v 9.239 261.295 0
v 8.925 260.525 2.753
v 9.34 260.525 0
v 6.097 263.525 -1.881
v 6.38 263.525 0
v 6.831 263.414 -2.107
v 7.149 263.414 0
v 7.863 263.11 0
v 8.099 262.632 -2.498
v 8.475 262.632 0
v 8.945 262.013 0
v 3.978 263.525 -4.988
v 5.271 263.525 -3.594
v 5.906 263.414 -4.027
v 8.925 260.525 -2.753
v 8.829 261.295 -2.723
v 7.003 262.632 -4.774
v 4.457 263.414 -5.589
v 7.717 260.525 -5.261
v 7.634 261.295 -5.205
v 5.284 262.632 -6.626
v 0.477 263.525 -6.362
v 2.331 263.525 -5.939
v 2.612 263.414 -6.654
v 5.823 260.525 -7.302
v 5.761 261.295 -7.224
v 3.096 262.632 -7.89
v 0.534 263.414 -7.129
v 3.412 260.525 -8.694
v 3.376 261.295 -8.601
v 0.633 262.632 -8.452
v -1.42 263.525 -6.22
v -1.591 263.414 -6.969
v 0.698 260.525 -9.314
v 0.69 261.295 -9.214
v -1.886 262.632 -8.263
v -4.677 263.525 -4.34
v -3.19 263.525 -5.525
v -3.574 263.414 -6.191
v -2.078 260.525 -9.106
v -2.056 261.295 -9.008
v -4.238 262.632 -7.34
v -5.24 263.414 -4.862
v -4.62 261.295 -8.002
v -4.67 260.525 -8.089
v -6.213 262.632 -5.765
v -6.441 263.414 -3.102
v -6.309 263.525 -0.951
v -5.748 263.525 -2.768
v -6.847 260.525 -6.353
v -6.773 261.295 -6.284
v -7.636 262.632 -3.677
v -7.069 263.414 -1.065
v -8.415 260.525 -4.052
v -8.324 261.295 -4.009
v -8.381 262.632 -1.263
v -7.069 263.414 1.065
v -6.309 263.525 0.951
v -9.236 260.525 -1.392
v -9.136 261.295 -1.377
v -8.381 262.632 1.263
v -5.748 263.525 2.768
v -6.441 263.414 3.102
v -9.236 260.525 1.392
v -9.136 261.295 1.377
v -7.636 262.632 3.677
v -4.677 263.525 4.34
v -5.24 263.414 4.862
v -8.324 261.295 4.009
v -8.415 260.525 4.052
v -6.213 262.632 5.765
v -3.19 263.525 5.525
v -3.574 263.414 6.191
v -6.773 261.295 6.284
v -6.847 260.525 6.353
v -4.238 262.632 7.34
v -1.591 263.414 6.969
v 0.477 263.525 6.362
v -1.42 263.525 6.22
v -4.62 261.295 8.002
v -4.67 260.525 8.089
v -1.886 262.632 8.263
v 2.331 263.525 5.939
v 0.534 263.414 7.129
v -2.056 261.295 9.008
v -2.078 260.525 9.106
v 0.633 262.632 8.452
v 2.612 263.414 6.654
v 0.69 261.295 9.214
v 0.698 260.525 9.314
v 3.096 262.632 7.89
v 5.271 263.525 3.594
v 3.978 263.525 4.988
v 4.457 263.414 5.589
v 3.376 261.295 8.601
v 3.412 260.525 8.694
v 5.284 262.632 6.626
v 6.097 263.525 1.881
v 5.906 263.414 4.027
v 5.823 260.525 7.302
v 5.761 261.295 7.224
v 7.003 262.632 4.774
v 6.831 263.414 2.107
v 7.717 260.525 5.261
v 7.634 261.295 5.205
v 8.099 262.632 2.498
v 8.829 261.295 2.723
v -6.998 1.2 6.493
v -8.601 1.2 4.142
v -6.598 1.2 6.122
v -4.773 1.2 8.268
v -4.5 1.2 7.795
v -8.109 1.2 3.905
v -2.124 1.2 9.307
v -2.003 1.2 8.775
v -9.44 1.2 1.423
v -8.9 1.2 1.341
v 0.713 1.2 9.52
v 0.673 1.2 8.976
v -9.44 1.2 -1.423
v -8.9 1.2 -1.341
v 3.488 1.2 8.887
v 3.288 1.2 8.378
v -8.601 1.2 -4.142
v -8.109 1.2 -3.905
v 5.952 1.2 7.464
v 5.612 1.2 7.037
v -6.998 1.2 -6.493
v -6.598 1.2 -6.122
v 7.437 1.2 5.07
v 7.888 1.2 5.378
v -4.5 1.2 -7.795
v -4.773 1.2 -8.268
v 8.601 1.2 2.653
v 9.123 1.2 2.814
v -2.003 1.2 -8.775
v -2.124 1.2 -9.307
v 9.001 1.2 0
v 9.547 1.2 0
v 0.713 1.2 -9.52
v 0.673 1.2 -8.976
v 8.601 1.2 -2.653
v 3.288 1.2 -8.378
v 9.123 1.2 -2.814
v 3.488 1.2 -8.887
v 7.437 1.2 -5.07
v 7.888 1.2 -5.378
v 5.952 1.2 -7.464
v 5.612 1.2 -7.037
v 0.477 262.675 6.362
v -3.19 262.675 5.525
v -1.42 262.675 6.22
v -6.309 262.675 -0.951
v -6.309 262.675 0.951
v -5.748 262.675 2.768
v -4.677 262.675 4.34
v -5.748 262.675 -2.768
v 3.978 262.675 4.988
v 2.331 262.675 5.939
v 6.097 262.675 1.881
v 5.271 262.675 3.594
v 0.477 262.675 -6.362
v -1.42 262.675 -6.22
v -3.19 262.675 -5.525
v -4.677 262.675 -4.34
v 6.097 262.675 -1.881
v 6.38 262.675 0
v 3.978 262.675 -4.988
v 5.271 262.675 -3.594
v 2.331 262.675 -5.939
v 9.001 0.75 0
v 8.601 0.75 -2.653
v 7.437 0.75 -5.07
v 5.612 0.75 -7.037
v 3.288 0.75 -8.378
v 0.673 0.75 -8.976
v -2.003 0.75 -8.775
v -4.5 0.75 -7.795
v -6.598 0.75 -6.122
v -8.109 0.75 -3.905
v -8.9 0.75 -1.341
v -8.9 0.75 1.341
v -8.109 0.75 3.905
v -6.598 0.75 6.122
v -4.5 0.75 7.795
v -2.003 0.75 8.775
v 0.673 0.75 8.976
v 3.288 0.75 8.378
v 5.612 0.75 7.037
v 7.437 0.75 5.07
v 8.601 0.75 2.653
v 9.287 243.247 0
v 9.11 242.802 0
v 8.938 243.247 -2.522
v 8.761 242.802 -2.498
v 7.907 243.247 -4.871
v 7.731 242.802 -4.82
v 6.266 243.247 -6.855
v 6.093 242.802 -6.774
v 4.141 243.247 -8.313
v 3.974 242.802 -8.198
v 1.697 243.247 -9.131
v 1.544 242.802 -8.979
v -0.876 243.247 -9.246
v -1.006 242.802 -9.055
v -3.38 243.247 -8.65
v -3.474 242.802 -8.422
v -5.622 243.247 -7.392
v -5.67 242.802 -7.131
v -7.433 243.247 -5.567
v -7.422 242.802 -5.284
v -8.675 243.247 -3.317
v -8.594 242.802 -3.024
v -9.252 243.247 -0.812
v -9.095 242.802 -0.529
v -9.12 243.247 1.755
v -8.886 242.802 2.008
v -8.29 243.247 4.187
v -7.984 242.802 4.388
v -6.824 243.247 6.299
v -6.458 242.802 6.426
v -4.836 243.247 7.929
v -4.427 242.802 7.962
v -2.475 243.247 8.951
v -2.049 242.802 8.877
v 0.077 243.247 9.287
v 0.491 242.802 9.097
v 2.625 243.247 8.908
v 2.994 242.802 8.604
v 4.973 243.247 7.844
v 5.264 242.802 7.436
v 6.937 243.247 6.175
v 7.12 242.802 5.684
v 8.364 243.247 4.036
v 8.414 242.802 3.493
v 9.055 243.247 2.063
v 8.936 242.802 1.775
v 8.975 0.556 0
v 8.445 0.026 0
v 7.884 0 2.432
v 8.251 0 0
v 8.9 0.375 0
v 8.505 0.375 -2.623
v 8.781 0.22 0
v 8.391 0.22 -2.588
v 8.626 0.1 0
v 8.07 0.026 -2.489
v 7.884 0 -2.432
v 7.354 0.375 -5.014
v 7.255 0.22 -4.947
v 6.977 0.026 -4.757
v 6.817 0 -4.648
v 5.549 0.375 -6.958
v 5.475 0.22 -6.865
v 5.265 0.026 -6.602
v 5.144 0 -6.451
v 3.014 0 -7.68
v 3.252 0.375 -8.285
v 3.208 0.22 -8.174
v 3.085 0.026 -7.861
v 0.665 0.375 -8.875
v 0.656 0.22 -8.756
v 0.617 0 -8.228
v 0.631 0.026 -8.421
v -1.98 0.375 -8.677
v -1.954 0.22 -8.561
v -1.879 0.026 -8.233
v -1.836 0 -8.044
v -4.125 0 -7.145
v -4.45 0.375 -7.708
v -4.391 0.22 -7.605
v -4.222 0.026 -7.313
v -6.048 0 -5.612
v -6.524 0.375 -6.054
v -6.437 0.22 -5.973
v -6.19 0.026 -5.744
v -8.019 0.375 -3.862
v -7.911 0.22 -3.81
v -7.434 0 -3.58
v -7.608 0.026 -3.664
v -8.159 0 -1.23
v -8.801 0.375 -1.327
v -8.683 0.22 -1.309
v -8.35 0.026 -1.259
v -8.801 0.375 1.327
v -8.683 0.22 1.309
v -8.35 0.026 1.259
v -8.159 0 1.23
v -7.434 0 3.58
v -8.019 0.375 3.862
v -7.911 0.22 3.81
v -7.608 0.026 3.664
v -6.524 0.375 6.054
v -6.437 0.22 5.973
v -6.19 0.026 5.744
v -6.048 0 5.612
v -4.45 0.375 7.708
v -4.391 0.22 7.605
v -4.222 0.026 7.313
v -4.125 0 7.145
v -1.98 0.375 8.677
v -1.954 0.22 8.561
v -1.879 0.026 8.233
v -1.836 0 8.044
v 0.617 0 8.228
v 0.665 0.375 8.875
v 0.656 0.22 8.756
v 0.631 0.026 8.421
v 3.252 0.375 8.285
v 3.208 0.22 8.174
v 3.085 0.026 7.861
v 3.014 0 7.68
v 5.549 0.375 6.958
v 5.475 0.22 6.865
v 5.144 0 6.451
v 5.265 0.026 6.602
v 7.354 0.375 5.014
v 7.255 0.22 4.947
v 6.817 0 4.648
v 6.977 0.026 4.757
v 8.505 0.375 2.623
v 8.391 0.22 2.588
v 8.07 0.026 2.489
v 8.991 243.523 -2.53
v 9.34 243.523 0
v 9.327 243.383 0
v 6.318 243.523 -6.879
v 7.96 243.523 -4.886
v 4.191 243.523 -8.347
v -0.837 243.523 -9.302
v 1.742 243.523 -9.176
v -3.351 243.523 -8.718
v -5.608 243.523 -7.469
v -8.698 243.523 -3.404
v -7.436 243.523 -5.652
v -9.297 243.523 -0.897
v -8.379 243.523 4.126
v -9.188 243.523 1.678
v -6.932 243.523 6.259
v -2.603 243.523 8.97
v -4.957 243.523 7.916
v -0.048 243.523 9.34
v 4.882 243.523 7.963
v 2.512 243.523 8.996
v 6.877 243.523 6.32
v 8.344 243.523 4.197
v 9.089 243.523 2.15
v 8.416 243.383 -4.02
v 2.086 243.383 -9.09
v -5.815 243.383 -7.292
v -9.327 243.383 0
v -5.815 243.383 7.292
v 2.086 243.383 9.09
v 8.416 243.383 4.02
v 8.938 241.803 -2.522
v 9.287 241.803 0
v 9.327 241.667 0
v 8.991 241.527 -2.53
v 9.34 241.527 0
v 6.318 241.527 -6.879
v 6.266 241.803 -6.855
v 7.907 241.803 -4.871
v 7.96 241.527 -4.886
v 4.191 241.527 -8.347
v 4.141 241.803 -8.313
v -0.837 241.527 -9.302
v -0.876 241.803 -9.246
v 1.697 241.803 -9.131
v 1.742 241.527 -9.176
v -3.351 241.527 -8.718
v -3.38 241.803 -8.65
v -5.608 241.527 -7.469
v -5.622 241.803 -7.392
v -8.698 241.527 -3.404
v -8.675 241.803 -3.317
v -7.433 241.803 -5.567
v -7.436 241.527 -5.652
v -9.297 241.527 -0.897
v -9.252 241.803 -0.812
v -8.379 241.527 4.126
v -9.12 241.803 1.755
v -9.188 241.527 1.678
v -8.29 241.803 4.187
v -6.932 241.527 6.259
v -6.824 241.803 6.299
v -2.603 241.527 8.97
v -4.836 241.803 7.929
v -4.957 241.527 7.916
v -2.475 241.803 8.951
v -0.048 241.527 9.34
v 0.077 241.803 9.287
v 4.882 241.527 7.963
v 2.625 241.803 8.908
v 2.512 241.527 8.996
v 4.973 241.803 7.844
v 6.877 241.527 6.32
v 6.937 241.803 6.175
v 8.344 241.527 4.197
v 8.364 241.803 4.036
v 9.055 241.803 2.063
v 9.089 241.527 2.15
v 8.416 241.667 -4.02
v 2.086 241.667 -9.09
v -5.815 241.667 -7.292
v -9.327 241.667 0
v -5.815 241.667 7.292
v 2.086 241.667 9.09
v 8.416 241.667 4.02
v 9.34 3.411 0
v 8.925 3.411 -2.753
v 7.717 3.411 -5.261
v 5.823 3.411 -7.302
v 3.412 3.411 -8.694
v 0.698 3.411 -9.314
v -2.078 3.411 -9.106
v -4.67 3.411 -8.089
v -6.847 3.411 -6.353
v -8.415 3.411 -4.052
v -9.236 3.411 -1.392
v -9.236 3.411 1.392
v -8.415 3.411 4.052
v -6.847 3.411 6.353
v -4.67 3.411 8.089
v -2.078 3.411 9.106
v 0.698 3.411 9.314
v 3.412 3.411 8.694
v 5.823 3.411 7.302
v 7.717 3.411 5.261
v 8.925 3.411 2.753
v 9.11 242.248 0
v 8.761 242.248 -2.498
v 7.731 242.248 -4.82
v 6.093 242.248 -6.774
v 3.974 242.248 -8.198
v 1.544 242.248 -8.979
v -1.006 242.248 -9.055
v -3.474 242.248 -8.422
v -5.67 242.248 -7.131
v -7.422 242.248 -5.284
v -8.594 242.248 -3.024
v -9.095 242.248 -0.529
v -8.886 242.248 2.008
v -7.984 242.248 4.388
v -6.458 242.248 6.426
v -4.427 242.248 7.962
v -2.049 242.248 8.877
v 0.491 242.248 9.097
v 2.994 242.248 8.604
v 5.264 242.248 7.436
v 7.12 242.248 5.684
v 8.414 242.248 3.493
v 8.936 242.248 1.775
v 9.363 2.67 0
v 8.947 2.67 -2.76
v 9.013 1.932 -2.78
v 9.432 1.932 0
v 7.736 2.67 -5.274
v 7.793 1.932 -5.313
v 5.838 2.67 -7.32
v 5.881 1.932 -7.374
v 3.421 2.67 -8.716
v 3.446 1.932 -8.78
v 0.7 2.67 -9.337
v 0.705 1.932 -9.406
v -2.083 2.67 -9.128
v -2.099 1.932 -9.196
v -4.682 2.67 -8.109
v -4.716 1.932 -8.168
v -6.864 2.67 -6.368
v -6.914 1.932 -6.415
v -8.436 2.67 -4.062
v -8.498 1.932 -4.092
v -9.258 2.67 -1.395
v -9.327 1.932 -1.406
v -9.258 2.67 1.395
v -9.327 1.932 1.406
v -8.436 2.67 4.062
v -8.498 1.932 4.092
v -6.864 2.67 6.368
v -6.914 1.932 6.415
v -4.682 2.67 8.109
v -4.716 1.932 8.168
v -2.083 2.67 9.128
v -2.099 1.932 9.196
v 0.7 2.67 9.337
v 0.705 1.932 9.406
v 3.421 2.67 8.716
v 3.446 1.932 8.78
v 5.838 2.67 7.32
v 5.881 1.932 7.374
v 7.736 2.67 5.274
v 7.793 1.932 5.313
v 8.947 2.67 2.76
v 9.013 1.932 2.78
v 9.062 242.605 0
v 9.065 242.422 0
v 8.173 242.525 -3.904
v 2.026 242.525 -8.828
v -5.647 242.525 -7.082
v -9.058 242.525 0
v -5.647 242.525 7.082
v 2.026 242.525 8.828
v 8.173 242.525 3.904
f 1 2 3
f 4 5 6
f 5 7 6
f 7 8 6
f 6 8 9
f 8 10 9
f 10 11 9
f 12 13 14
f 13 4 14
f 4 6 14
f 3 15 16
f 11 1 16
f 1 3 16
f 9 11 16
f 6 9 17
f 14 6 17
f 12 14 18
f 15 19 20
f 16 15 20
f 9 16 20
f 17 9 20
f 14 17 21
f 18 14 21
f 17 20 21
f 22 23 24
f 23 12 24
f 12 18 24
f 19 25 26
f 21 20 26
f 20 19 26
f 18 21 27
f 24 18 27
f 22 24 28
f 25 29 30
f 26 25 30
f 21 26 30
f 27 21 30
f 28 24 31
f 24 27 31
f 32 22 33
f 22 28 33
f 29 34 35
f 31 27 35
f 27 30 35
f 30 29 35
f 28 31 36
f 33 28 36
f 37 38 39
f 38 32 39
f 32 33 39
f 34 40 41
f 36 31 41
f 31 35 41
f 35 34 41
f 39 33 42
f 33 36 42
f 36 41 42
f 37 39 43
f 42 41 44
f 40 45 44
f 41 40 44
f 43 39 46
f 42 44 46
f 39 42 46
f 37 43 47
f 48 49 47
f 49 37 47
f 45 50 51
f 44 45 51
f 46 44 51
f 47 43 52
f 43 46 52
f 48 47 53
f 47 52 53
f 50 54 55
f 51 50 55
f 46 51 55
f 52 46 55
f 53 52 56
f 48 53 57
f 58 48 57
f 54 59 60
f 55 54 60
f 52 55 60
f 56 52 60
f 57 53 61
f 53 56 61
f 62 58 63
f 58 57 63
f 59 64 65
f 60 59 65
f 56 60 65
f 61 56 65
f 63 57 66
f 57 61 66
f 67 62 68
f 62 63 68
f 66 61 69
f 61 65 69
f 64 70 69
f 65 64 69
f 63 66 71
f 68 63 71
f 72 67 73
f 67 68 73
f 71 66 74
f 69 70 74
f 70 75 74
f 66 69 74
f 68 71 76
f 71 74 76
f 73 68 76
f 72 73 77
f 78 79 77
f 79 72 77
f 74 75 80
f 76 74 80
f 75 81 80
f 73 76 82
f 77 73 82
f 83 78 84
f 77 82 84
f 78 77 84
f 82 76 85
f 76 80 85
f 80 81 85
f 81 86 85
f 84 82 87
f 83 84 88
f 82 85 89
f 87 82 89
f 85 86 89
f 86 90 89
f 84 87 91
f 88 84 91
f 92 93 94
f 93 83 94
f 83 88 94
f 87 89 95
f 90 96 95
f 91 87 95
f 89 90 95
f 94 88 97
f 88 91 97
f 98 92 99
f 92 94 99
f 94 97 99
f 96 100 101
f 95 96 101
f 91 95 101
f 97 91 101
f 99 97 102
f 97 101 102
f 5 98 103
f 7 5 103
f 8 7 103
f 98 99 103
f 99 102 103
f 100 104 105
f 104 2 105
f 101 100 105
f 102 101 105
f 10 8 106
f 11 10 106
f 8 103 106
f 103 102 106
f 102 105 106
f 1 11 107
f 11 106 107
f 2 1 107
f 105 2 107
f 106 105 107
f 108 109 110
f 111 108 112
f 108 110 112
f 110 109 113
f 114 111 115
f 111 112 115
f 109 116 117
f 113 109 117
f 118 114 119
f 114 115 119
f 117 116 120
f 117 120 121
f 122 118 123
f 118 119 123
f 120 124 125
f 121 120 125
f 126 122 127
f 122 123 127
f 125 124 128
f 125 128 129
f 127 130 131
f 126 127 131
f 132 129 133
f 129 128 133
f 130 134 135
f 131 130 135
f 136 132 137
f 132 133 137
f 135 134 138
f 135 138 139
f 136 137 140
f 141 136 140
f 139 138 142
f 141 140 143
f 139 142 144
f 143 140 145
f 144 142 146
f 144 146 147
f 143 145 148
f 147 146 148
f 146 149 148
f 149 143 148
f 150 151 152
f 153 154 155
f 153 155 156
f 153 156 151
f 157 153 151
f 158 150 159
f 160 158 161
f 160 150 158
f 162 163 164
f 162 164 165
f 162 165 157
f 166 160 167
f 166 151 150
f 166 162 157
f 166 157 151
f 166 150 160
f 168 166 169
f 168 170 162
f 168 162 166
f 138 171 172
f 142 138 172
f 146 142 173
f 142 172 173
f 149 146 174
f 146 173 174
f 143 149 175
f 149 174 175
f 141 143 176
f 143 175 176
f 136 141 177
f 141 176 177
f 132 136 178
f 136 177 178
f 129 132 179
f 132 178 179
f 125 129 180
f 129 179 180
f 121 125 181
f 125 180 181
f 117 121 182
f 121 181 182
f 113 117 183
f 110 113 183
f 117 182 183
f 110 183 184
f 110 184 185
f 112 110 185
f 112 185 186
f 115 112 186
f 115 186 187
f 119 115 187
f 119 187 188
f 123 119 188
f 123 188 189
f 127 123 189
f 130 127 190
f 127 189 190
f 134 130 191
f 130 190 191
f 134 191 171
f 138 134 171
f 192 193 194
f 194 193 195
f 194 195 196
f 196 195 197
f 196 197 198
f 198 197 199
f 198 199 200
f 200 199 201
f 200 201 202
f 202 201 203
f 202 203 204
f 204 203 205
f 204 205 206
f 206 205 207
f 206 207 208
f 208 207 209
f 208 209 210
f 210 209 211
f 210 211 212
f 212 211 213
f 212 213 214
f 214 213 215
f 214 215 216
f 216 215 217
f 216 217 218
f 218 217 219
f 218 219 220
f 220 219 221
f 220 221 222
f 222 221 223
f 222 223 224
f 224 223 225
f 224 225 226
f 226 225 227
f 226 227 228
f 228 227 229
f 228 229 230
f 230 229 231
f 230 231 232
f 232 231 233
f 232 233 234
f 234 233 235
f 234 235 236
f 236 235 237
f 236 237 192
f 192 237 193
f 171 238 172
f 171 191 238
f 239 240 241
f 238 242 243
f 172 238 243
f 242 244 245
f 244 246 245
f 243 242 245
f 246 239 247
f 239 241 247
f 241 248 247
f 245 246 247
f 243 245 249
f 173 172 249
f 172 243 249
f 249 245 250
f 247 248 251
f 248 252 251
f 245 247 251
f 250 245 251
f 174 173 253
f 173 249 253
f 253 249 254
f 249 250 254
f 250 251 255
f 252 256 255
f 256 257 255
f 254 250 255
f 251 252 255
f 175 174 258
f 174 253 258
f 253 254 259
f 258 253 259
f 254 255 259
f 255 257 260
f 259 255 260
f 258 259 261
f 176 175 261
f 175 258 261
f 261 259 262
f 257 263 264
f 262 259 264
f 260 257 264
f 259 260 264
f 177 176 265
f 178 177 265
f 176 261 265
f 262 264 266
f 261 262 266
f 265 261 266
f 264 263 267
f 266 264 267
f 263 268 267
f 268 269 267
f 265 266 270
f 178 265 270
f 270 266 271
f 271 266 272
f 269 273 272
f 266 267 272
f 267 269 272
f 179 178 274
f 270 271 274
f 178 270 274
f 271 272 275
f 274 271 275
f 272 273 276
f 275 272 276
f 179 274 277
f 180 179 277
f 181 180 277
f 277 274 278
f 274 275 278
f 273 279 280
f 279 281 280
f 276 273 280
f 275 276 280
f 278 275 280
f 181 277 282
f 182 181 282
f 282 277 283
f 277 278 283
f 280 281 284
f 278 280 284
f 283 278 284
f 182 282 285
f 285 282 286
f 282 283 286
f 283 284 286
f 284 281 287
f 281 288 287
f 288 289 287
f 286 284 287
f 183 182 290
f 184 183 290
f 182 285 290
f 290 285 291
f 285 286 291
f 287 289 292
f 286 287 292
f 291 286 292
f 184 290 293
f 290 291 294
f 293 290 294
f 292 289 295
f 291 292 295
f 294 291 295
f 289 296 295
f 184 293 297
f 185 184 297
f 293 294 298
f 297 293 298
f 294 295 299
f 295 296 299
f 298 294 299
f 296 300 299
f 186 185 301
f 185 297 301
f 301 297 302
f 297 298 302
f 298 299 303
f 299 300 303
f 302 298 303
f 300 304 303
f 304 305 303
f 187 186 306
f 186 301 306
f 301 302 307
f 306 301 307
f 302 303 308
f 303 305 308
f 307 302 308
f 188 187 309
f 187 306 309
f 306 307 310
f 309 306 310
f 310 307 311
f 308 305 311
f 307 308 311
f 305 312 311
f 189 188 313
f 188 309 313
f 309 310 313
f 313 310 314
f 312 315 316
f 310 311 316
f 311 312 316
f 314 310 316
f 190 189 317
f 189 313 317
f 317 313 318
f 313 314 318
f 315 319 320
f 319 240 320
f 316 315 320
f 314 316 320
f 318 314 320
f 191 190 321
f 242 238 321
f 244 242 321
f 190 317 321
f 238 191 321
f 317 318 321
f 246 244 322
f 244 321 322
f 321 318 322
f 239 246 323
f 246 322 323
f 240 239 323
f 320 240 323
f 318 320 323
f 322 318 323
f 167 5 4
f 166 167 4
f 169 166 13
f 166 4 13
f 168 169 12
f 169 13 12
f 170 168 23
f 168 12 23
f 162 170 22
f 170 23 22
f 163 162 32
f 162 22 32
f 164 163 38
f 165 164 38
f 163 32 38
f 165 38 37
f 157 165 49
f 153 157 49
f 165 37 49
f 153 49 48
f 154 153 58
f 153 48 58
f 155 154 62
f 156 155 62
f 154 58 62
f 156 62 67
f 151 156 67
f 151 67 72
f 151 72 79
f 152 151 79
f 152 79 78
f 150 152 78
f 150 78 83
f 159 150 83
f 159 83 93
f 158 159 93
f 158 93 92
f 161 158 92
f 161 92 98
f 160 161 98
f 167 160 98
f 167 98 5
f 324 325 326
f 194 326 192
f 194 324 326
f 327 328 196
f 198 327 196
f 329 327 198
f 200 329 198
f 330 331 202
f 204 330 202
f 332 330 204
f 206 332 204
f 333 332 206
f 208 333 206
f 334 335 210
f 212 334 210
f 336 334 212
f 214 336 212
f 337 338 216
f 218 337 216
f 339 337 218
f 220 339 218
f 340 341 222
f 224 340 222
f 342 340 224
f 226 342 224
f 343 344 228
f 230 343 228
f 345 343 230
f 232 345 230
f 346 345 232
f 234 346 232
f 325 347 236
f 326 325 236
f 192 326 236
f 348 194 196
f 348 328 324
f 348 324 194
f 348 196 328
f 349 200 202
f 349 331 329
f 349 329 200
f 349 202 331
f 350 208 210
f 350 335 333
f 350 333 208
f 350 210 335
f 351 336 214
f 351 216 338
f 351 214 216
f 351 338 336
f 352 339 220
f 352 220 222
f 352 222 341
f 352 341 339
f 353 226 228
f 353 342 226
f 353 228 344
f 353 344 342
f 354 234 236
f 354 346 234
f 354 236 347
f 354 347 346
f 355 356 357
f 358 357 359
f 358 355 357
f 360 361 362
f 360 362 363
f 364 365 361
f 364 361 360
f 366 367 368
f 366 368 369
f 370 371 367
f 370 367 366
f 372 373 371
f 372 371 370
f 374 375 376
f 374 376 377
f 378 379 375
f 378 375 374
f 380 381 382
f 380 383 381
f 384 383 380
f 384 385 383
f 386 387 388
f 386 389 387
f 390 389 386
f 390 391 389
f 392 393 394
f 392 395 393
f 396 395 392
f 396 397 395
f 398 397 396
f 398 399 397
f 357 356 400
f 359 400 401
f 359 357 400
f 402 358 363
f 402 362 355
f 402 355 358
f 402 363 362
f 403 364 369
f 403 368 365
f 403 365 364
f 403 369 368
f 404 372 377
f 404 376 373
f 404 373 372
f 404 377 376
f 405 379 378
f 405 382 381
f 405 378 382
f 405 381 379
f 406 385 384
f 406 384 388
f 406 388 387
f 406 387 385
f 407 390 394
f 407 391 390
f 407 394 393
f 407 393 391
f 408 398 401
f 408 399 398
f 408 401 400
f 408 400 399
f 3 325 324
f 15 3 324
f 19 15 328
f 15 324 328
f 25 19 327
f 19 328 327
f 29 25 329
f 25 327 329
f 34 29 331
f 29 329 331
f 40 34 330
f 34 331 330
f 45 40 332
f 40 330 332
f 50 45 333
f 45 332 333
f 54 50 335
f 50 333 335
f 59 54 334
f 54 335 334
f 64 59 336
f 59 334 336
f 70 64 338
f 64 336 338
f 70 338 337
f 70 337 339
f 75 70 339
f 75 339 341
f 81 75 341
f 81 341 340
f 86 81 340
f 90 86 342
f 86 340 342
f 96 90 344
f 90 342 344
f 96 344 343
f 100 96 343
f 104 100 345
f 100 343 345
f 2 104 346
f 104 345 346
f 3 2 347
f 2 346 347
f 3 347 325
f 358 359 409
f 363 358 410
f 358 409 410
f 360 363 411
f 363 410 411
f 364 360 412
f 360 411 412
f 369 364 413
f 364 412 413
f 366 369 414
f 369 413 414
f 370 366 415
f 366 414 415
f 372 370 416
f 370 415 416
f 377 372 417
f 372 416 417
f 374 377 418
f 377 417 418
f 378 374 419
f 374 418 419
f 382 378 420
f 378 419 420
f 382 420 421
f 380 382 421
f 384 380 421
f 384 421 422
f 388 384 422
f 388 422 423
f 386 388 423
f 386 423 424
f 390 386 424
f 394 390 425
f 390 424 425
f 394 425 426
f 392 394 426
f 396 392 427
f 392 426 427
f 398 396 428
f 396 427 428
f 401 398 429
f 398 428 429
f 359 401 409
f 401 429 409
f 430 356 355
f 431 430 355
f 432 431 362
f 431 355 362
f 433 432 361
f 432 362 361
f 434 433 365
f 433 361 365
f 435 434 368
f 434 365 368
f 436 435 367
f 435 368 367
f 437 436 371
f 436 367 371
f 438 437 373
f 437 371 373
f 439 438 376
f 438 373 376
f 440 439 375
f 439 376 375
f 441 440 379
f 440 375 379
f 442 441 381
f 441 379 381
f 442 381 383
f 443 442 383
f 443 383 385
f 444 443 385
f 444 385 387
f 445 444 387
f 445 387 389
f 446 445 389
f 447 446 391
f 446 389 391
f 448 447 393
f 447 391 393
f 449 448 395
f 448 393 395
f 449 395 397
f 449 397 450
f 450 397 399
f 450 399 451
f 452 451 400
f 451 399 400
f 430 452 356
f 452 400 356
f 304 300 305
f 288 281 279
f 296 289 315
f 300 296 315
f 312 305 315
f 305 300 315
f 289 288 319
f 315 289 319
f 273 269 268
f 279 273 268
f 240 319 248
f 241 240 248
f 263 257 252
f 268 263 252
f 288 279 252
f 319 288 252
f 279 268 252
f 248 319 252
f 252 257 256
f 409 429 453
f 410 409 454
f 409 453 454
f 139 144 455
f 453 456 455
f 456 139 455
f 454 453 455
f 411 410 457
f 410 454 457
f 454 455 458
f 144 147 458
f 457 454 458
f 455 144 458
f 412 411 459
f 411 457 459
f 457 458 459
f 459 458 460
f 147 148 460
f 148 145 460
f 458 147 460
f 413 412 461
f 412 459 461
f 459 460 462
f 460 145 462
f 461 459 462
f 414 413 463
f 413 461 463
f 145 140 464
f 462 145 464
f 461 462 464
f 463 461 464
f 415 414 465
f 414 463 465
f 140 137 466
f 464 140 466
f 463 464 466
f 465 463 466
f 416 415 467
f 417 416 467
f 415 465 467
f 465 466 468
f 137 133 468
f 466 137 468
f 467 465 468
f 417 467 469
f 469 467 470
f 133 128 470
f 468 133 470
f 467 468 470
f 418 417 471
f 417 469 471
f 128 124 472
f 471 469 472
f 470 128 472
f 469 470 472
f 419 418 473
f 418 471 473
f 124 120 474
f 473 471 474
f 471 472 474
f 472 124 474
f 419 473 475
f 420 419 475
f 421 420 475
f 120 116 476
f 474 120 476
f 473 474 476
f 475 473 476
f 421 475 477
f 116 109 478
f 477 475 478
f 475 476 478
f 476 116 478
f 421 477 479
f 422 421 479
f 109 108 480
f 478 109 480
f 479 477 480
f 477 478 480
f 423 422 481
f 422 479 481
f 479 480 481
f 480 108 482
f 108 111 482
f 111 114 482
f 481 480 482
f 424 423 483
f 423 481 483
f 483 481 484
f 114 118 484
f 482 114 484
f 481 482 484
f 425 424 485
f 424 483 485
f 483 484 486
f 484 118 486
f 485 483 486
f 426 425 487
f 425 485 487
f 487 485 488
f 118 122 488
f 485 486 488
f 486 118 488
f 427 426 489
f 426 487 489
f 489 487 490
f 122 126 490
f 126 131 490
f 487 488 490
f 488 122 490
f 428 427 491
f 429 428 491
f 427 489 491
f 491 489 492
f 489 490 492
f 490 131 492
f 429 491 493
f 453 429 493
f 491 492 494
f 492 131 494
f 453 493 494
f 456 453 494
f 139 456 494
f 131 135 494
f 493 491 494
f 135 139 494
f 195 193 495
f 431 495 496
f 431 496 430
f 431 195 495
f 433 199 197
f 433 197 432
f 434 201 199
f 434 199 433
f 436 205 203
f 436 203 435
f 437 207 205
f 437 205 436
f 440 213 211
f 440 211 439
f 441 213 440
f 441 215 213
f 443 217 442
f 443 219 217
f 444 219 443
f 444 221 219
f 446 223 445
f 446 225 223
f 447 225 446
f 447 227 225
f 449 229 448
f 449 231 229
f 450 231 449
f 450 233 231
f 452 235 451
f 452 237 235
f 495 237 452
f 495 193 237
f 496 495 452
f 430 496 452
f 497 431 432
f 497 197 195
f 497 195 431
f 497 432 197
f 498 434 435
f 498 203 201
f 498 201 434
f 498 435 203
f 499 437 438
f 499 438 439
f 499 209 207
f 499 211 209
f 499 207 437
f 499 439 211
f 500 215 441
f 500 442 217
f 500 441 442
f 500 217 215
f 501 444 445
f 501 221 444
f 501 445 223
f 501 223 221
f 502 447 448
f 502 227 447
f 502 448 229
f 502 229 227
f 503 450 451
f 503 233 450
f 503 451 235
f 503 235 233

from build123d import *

# Parameters (mm, degrees)
FILLET1_R          = 3
FILLET2_R          = 0.75
SKETCH3_R          = 6.38
CUT_EXTRUDE1_DEPTH = 0.85


with BuildPart() as part:
    # Sketch2 → Revolve1 (revolve)
    with BuildSketch(Plane.XY):
        with BuildLine():
            Line((0, 263.525), (9.34, 263.525))
            Line((9.34, 263.525), (9.34, 243.380049267))
            Line((9.34, 243.380049267), (9.000677154, 242.525))
            Line((9.000677154, 242.525), (9.34, 241.669950733))
            Line((9.34, 241.669950733), (9.34, 3.410583034))
            ThreePointArc((9.34, 3.410583034), (9.391810091, 2.300465987), (9.546789941, 1.2))
            Line((9.546789941, 1.2), (9.000677154, 1.2))
            Line((9.000677154, 1.2), (9.000677154, 0))
            Line((9.000677154, 0), (0, 0))
            Line((0, 0), (0, 263.525))
        make_face()
    revolve(axis=Axis((0, 0, 0), (0, 1, 0)))

    # Fillet1
    fillet1_edges = [part.edges().sort_by_distance(p)[0] for p in [
        (-9.34, 263.525, 0),
    ]]
    fillet(fillet1_edges, radius=FILLET1_R)

    # Fillet2
    fillet2_edges = [part.edges().sort_by_distance(p)[0] for p in [
        (-9.000677154, 0, 0),
        (-9.34, 243.380049267, 0),
        (-9.000677154, 242.525, 0),
        (-9.34, 241.669950733, 0),
    ]]
    fillet(fillet2_edges, radius=FILLET2_R)

    # Sketch3 → Cut-Extrude1 (cut)
    with BuildSketch(Plane(origin=(0, 263.525, 0), x_dir=(1, 0, 0), z_dir=(0, 1, 0))):
        Circle(SKETCH3_R)
    extrude(amount=-CUT_EXTRUDE1_DEPTH, mode=Mode.SUBTRACT)


solid = part.part
